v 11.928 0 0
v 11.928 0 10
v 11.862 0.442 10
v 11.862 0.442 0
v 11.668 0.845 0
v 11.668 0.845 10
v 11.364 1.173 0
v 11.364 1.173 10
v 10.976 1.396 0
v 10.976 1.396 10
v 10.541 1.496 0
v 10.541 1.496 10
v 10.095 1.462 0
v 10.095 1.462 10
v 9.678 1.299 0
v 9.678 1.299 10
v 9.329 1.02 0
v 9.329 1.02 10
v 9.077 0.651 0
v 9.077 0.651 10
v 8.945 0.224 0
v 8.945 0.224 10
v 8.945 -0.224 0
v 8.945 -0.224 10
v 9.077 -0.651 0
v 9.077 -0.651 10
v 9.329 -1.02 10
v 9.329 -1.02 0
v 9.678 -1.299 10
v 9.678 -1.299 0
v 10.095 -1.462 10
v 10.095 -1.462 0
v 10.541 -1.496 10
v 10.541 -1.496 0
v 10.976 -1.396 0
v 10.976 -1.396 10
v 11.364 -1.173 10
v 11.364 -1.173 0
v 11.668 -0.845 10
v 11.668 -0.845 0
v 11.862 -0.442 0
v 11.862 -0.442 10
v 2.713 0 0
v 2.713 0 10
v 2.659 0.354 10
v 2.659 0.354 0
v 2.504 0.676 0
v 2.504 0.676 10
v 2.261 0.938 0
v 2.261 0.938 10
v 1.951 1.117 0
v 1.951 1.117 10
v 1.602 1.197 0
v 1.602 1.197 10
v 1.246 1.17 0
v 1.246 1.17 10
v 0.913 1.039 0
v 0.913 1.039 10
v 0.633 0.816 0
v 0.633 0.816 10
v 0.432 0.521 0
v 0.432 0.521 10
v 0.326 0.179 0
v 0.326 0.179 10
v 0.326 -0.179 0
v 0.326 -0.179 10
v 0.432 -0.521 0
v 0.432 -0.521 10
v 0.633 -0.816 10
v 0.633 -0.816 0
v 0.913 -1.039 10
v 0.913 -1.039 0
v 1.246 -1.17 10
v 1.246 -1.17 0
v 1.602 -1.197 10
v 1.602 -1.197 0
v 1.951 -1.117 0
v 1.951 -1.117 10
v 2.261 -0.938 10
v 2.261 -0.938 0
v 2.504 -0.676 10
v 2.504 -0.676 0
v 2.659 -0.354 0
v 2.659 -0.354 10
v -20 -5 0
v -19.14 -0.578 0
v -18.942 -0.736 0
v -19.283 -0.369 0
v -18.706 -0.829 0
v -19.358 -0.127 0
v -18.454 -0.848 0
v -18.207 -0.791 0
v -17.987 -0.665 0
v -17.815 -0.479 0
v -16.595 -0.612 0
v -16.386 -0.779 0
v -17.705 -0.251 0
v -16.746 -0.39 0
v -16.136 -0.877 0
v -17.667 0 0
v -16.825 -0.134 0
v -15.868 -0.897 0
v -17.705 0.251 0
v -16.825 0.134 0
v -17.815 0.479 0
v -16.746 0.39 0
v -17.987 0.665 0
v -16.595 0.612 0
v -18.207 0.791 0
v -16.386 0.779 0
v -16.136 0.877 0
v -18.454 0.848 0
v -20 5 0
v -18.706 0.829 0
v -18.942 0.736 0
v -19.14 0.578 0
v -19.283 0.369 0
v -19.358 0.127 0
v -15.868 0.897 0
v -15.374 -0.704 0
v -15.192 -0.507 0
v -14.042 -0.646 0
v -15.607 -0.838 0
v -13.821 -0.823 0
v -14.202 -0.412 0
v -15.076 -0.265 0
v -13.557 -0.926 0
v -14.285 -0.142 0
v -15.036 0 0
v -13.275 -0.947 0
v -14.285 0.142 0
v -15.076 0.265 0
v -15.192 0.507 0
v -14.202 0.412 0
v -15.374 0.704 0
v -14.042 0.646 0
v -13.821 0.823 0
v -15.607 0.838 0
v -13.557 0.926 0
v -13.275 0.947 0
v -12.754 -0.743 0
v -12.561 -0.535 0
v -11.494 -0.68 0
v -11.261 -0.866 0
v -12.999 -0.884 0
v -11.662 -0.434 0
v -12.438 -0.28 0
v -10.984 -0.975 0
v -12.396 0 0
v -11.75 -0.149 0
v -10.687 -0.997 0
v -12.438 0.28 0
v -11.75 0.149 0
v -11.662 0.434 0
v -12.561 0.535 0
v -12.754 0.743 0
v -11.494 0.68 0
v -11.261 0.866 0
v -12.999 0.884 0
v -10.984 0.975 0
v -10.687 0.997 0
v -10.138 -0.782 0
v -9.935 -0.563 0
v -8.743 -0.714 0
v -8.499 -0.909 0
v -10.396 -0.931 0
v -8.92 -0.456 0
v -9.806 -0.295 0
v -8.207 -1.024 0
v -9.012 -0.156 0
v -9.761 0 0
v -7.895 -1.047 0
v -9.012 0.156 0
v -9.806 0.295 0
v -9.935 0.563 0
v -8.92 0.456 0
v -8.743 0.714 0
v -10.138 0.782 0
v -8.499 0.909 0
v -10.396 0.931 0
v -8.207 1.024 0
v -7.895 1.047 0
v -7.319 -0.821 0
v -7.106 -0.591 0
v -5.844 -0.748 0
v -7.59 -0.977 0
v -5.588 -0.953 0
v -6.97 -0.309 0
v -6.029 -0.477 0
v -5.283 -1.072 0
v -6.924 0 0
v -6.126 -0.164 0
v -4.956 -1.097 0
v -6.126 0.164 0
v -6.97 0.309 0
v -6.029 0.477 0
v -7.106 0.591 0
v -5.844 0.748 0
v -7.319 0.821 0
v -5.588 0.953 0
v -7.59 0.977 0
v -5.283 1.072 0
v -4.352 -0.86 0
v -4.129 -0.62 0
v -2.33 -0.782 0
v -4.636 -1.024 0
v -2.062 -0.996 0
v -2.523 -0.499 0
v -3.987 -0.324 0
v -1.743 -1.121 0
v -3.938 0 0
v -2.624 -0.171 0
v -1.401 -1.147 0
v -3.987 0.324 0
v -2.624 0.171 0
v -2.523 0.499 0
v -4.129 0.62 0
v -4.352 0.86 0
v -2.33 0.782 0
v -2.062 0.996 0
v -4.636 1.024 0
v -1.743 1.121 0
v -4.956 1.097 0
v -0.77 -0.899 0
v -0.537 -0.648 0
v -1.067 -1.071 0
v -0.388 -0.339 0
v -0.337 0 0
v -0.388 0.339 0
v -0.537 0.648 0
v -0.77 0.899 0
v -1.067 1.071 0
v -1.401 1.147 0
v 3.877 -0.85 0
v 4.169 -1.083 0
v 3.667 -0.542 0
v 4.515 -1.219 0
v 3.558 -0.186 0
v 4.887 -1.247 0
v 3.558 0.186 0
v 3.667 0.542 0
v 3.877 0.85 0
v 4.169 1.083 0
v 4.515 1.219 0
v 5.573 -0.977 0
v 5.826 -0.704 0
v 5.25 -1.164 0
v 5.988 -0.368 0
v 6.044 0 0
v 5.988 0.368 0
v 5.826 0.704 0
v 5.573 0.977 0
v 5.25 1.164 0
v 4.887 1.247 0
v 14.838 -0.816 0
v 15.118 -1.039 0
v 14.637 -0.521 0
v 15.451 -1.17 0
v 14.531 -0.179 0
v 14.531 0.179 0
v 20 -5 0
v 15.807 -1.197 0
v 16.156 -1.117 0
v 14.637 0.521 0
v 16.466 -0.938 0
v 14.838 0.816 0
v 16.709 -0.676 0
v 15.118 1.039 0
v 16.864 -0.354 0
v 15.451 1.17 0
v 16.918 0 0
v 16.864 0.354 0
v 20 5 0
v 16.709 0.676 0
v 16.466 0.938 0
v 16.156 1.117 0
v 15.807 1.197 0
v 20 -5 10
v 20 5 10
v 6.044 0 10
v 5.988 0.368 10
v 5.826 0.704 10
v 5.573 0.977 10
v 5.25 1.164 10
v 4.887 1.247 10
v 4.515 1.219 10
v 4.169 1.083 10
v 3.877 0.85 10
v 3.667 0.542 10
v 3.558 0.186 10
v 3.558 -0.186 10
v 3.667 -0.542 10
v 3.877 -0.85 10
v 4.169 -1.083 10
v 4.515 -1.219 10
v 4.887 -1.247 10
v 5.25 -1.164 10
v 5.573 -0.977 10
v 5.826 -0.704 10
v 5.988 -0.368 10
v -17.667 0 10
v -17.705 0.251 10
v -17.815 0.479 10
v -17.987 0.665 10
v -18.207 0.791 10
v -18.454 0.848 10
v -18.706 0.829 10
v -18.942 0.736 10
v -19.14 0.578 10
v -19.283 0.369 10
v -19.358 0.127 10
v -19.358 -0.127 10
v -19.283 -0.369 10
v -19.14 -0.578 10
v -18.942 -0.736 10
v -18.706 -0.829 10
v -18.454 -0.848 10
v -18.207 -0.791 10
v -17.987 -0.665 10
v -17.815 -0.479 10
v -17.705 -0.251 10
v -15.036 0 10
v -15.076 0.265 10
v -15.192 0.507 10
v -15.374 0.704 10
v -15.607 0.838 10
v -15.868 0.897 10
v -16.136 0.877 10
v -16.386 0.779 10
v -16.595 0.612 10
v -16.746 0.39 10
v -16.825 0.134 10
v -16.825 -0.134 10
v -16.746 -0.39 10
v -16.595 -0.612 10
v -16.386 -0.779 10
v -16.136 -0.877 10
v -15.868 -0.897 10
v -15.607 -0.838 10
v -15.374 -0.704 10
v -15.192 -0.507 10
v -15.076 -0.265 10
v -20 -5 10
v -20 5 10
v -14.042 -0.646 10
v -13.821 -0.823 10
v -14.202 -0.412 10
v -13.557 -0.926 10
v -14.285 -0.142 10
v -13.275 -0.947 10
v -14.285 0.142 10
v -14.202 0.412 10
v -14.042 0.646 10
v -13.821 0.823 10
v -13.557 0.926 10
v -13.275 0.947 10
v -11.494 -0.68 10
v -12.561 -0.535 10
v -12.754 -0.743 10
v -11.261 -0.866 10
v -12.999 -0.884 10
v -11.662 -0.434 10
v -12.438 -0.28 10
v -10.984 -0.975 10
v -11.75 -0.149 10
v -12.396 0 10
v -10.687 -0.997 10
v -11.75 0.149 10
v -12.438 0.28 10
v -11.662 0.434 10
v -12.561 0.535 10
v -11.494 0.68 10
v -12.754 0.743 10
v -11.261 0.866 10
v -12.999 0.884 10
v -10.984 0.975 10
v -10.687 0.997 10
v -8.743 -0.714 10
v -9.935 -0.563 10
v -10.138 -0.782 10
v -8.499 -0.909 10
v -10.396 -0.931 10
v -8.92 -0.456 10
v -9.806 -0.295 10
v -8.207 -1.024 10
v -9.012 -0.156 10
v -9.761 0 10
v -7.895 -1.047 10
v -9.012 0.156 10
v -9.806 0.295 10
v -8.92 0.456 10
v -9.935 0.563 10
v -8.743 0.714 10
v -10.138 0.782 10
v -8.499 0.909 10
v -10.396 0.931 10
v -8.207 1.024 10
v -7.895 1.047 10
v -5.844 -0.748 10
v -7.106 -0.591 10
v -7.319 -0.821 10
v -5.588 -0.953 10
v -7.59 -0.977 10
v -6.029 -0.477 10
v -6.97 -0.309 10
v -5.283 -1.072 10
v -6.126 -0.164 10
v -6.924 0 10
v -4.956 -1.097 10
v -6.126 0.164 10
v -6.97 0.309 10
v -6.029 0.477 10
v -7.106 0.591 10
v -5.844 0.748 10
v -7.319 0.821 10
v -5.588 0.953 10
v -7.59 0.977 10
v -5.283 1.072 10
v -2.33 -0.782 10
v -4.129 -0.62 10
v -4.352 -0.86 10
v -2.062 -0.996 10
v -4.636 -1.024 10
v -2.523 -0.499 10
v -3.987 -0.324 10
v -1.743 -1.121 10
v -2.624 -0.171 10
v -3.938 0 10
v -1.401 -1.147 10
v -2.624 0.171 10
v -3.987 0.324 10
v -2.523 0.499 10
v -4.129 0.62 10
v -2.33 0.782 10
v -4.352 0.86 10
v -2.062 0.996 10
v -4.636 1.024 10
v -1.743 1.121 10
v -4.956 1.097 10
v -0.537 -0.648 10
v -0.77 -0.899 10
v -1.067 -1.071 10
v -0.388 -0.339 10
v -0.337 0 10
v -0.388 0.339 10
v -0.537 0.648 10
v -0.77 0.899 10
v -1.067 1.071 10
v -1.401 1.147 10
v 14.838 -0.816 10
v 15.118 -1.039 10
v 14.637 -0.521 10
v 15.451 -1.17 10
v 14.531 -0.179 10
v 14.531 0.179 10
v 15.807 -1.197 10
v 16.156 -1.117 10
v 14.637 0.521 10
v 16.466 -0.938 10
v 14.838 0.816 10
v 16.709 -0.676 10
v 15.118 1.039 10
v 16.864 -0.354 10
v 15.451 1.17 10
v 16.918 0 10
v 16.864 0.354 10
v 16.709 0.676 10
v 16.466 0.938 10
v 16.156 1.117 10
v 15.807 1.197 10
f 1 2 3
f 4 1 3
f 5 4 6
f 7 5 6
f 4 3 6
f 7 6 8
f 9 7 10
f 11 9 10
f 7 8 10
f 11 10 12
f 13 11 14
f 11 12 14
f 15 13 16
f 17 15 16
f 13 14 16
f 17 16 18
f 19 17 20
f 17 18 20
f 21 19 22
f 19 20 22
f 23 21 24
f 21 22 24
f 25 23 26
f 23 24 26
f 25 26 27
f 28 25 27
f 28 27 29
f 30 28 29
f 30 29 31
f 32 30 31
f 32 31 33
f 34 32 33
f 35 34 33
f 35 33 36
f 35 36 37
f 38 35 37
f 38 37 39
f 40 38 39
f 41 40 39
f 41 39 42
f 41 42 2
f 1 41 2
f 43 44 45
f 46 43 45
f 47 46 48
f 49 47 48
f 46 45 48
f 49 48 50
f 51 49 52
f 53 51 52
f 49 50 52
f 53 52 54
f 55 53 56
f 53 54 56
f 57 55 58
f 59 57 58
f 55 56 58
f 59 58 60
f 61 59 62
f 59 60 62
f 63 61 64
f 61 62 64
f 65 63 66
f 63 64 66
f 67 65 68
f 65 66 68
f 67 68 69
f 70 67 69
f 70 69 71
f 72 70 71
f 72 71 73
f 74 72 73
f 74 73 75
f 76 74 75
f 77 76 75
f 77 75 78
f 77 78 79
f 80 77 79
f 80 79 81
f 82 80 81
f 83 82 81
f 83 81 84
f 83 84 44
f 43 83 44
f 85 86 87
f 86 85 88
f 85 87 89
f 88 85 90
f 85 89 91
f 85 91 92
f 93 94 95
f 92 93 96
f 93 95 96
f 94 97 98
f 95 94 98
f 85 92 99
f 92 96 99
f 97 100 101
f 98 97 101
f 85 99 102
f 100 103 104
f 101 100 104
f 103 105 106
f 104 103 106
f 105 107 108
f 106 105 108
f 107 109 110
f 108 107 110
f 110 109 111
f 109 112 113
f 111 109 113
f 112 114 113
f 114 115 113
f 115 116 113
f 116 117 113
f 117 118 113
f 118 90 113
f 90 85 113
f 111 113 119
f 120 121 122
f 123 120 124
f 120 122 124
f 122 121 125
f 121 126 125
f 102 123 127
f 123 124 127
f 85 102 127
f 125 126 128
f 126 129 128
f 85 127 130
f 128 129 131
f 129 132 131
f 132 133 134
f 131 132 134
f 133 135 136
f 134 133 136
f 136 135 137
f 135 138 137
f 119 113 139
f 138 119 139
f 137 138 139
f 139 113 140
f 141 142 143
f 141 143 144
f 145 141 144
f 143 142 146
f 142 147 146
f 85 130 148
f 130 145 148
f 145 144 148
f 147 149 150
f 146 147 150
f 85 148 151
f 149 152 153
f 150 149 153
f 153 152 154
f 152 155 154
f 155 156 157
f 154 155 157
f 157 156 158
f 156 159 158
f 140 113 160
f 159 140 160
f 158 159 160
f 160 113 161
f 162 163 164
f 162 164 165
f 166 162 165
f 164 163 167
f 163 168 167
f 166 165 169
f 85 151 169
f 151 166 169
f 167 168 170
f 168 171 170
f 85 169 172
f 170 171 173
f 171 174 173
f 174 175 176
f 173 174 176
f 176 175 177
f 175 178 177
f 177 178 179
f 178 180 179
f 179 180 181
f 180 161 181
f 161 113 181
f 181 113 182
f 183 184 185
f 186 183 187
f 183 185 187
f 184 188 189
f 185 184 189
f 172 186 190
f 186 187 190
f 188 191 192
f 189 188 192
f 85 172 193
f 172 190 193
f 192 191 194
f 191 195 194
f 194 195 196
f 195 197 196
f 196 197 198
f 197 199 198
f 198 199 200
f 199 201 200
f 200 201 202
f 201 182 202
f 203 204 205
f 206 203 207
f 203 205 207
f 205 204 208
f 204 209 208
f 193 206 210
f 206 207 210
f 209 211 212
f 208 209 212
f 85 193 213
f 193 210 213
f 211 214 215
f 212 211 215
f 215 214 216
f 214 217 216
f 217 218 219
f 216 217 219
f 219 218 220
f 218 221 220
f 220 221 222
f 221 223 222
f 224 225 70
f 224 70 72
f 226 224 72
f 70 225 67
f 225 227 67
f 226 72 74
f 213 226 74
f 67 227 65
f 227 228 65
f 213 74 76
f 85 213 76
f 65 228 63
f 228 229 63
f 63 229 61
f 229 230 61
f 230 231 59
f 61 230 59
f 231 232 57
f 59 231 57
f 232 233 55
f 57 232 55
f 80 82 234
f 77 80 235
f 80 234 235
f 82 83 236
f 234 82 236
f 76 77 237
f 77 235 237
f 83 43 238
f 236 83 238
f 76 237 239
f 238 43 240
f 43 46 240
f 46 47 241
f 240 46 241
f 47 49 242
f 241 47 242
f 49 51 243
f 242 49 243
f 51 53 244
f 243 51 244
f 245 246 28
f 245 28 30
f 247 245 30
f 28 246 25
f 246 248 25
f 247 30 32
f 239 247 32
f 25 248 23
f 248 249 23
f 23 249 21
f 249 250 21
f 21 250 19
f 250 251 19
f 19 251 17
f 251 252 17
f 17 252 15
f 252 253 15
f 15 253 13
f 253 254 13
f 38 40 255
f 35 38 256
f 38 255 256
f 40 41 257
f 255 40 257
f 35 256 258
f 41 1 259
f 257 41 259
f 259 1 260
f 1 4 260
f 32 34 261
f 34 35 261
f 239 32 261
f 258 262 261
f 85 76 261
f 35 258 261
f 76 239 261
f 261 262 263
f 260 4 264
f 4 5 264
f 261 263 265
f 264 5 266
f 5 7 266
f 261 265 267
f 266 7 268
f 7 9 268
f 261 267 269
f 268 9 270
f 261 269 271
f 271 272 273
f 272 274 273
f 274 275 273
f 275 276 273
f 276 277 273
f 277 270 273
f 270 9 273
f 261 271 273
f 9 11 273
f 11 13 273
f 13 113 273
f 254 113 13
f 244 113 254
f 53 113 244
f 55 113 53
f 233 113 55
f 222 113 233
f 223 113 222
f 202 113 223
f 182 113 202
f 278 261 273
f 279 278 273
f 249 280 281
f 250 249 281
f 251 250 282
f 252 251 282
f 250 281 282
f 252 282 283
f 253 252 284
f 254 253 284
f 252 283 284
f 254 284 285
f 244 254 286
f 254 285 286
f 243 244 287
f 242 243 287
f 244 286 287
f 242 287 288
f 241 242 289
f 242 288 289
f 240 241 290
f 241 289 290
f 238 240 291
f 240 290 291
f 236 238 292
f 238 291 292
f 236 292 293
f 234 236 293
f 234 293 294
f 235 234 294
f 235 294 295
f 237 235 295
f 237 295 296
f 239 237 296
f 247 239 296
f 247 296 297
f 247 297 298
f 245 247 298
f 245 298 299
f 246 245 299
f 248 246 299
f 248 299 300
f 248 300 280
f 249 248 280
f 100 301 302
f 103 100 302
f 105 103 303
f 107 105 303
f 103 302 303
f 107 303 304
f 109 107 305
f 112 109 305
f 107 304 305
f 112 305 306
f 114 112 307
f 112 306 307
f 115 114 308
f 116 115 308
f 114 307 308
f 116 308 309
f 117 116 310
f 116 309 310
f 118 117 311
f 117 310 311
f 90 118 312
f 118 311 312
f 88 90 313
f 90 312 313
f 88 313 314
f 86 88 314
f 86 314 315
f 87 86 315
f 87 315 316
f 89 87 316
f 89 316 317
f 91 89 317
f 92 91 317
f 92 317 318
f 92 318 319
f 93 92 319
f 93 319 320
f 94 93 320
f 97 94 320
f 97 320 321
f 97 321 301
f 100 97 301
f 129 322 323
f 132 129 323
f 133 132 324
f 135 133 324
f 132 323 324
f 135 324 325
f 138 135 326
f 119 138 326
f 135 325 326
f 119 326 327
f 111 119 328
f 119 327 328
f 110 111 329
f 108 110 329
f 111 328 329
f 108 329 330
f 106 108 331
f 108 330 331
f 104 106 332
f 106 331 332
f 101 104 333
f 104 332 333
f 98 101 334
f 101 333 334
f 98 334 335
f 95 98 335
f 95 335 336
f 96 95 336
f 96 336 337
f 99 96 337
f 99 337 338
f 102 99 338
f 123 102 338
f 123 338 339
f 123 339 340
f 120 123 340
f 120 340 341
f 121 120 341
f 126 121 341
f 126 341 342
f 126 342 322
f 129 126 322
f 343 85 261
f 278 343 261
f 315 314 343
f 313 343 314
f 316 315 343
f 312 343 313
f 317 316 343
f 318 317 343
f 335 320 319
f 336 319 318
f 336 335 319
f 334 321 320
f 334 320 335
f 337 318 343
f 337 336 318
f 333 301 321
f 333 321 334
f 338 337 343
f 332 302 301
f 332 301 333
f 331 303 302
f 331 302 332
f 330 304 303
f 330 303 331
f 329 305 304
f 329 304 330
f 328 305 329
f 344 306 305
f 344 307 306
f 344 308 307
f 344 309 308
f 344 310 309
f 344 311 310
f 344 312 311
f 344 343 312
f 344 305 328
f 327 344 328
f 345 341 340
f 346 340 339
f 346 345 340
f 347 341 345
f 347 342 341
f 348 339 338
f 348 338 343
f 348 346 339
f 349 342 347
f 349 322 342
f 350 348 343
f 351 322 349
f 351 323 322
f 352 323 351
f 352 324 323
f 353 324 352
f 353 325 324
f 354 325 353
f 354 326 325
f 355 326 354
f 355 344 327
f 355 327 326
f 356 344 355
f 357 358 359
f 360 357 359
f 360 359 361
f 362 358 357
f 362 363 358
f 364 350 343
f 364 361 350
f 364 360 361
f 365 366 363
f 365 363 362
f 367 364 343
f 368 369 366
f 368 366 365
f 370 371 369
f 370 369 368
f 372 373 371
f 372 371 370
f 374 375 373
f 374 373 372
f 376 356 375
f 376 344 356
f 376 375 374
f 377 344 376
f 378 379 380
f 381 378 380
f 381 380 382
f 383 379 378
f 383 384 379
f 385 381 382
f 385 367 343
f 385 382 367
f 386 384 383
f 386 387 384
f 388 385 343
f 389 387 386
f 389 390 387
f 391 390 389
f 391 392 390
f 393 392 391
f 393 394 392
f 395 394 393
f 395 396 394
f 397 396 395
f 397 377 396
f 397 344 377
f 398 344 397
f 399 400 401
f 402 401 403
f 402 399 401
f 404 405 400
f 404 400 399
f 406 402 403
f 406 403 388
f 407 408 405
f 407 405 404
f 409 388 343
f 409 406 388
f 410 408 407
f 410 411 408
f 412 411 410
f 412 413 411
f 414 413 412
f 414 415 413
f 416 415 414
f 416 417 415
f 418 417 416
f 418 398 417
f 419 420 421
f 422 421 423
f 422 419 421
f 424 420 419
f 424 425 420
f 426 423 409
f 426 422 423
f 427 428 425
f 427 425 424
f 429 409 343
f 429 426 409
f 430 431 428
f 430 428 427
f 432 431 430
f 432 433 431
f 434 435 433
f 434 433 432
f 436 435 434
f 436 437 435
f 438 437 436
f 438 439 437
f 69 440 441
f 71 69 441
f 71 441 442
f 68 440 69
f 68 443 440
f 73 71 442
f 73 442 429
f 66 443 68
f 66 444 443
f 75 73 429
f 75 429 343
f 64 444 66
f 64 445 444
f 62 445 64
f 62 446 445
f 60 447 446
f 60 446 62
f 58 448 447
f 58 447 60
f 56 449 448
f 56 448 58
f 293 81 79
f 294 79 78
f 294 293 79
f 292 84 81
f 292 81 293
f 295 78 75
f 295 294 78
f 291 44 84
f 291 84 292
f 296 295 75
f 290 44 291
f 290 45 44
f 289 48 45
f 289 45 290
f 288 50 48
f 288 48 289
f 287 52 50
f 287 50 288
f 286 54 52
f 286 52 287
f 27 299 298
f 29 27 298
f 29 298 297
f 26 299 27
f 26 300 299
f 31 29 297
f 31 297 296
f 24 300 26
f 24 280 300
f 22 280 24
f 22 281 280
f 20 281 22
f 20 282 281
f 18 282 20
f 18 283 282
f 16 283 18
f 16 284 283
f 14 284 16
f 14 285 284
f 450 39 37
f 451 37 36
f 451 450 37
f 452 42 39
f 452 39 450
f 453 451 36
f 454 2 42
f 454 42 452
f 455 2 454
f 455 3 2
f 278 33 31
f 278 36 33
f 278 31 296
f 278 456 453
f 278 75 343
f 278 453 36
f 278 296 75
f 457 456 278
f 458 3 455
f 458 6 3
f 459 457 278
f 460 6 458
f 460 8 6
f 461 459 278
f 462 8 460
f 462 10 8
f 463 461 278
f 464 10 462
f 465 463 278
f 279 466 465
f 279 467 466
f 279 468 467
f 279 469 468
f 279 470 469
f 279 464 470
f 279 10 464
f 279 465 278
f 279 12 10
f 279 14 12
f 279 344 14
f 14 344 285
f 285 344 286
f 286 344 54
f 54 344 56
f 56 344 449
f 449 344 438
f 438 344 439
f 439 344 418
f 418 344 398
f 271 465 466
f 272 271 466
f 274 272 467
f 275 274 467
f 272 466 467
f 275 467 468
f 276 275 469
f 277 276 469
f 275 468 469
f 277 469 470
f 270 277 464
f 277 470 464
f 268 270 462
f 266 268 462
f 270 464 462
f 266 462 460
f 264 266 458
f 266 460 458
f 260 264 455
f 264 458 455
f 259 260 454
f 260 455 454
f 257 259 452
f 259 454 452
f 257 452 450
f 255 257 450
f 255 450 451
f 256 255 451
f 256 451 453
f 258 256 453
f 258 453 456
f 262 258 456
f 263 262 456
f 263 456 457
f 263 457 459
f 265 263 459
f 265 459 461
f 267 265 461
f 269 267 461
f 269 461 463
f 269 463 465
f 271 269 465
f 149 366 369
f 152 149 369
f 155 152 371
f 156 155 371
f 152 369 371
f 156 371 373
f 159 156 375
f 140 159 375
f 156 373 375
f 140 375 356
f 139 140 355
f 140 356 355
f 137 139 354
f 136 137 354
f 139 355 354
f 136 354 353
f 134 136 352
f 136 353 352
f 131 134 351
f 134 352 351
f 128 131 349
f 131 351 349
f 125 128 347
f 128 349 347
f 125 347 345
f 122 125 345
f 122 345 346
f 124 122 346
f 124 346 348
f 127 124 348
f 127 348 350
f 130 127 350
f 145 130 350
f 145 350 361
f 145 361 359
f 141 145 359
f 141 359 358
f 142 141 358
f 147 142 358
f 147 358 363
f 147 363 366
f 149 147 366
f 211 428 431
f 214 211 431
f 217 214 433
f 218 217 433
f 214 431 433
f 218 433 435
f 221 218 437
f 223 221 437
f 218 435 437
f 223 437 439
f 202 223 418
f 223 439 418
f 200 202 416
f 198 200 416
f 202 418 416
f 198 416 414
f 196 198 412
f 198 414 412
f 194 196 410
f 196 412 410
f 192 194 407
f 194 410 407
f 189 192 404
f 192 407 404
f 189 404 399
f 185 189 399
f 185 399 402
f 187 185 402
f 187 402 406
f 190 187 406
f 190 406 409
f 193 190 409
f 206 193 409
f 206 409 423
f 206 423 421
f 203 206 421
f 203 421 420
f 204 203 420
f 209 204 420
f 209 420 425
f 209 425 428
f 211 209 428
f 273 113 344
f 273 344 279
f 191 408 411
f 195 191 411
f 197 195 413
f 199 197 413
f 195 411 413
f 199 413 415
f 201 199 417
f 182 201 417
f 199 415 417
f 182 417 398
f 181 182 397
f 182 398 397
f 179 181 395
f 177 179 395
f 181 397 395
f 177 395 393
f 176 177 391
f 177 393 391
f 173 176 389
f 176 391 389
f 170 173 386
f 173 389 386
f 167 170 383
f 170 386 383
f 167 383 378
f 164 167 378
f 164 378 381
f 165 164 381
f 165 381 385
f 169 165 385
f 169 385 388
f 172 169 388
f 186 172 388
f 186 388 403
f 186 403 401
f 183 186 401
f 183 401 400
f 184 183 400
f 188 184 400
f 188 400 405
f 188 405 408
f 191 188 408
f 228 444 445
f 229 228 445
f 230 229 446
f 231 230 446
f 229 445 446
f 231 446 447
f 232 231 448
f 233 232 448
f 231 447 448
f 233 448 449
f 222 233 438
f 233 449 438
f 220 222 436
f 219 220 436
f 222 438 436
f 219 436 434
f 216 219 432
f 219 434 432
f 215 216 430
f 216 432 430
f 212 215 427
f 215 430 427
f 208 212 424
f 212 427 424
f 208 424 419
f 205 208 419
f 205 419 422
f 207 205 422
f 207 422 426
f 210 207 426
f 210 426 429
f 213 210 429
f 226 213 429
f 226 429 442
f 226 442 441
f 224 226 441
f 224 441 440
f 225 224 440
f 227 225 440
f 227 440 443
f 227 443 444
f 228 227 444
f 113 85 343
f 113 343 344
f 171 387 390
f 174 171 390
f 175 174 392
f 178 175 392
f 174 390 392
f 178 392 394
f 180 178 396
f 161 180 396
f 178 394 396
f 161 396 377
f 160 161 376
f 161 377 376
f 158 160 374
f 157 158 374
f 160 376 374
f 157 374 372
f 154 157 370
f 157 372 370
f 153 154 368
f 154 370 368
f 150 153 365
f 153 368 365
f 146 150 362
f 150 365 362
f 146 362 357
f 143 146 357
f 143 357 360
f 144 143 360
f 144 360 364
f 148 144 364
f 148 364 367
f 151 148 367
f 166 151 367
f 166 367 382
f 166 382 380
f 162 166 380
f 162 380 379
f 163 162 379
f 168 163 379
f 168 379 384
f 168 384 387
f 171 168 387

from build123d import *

# Parameters (mm, degrees)
SKETCH_W      = 40
SKETCH_H      = 10
PAD_DEPTH     = 10
SKETCH001_R   = 0.85
HOLE_DEPTH    = 25
SKETCH002_R   = 0.9
HOLE001_DEPTH = 25
SKETCH003_R   = 0.95
HOLE002_DEPTH = 25
SKETCH004_R   = 1
HOLE003_DEPTH = 25
SKETCH005_R   = 1.05
HOLE004_DEPTH = 25
SKETCH006_R   = 1.1
HOLE005_DEPTH = 25
SKETCH007_R   = 1.15
HOLE006_DEPTH = 25
SKETCH008_R   = 1.2
HOLE007_DEPTH = 25
SKETCH009_R   = 1.25
HOLE008_DEPTH = 25
SKETCH010_R   = 1.2
HOLE009_DEPTH = 25
SKETCH011_R   = 1.5
HOLE010_DEPTH = 25


with BuildPart() as part:
    # Sketch → Pad (new body)
    with BuildSketch(Plane.XY):
        Rectangle(SKETCH_W, SKETCH_H)
    extrude(amount=PAD_DEPTH)

    # Sketch001 (on Face6 of Pad) → Hole (cut)
    with BuildSketch(Plane.XY.offset(10)):
        with Locations((-18.51713, 0)):
            Circle(SKETCH001_R)
    extrude(amount=-HOLE_DEPTH, mode=Mode.SUBTRACT)

    # Sketch002 (on Face6 of Pad) → Hole001 (cut)
    with BuildSketch(Plane.XY.offset(10)):
        with Locations((-15.935542, 0)):
            Circle(SKETCH002_R)
    extrude(amount=-HOLE001_DEPTH, mode=Mode.SUBTRACT)

    # Sketch003 (on Face6 of Pad) → Hole002 (cut)
    with BuildSketch(Plane.XY.offset(10)):
        with Locations((-13.345876, 0)):
            Circle(SKETCH003_R)
    extrude(amount=-HOLE002_DEPTH, mode=Mode.SUBTRACT)

    # Sketch004 (on Face6 of Pad) → Hole003 (cut)
    with BuildSketch(Plane.XY.offset(10)):
        with Locations((-10.761359, 0)):
            Circle(SKETCH004_R)
    extrude(amount=-HOLE003_DEPTH, mode=Mode.SUBTRACT)

    # Sketch005 (on Face6 of Pad) → Hole004 (cut)
    with BuildSketch(Plane.XY.offset(10)):
        with Locations((-7.973536, 0)):
            Circle(SKETCH005_R)
    extrude(amount=-HOLE004_DEPTH, mode=Mode.SUBTRACT)

    # Sketch006 (on Face6 of Pad) → Hole005 (cut)
    with BuildSketch(Plane.XY.offset(10)):
        with Locations((-5.038025, 0)):
            Circle(SKETCH006_R)
    extrude(amount=-HOLE005_DEPTH, mode=Mode.SUBTRACT)

    # Sketch007 (on Face6 of Pad) → Hole006 (cut)
    with BuildSketch(Plane.XY.offset(10)):
        with Locations((-1.486799, 0)):
            Circle(SKETCH007_R)
    extrude(amount=-HOLE006_DEPTH, mode=Mode.SUBTRACT)

    # Sketch008 (on Face6 of Pad) → Hole007 (cut)
    with BuildSketch(Plane.XY.offset(10)):
        with Locations((1.512776, 0)):
            Circle(SKETCH008_R)
    extrude(amount=-HOLE007_DEPTH, mode=Mode.SUBTRACT)

    # Sketch009 (on Face6 of Pad) → Hole008 (cut)
    with BuildSketch(Plane.XY.offset(10)):
        with Locations((4.793622, 0)):
            Circle(SKETCH009_R)
    extrude(amount=-HOLE008_DEPTH, mode=Mode.SUBTRACT)

    # Sketch010 (on Face6 of Pad) → Hole009 (cut)
    with BuildSketch(Plane.XY.offset(10)):
        with Locations((15.717695, 0)):
            Circle(SKETCH010_R)
    extrude(amount=-HOLE009_DEPTH, mode=Mode.SUBTRACT)

    # Sketch011 (on Face5 of Hole009) → Hole010 (cut)
    with BuildSketch(Plane.XY.offset(10)):
        with Locations((10.428464, 0)):
            Circle(SKETCH011_R)
    extrude(amount=-HOLE010_DEPTH, mode=Mode.SUBTRACT)


solid = part.part
